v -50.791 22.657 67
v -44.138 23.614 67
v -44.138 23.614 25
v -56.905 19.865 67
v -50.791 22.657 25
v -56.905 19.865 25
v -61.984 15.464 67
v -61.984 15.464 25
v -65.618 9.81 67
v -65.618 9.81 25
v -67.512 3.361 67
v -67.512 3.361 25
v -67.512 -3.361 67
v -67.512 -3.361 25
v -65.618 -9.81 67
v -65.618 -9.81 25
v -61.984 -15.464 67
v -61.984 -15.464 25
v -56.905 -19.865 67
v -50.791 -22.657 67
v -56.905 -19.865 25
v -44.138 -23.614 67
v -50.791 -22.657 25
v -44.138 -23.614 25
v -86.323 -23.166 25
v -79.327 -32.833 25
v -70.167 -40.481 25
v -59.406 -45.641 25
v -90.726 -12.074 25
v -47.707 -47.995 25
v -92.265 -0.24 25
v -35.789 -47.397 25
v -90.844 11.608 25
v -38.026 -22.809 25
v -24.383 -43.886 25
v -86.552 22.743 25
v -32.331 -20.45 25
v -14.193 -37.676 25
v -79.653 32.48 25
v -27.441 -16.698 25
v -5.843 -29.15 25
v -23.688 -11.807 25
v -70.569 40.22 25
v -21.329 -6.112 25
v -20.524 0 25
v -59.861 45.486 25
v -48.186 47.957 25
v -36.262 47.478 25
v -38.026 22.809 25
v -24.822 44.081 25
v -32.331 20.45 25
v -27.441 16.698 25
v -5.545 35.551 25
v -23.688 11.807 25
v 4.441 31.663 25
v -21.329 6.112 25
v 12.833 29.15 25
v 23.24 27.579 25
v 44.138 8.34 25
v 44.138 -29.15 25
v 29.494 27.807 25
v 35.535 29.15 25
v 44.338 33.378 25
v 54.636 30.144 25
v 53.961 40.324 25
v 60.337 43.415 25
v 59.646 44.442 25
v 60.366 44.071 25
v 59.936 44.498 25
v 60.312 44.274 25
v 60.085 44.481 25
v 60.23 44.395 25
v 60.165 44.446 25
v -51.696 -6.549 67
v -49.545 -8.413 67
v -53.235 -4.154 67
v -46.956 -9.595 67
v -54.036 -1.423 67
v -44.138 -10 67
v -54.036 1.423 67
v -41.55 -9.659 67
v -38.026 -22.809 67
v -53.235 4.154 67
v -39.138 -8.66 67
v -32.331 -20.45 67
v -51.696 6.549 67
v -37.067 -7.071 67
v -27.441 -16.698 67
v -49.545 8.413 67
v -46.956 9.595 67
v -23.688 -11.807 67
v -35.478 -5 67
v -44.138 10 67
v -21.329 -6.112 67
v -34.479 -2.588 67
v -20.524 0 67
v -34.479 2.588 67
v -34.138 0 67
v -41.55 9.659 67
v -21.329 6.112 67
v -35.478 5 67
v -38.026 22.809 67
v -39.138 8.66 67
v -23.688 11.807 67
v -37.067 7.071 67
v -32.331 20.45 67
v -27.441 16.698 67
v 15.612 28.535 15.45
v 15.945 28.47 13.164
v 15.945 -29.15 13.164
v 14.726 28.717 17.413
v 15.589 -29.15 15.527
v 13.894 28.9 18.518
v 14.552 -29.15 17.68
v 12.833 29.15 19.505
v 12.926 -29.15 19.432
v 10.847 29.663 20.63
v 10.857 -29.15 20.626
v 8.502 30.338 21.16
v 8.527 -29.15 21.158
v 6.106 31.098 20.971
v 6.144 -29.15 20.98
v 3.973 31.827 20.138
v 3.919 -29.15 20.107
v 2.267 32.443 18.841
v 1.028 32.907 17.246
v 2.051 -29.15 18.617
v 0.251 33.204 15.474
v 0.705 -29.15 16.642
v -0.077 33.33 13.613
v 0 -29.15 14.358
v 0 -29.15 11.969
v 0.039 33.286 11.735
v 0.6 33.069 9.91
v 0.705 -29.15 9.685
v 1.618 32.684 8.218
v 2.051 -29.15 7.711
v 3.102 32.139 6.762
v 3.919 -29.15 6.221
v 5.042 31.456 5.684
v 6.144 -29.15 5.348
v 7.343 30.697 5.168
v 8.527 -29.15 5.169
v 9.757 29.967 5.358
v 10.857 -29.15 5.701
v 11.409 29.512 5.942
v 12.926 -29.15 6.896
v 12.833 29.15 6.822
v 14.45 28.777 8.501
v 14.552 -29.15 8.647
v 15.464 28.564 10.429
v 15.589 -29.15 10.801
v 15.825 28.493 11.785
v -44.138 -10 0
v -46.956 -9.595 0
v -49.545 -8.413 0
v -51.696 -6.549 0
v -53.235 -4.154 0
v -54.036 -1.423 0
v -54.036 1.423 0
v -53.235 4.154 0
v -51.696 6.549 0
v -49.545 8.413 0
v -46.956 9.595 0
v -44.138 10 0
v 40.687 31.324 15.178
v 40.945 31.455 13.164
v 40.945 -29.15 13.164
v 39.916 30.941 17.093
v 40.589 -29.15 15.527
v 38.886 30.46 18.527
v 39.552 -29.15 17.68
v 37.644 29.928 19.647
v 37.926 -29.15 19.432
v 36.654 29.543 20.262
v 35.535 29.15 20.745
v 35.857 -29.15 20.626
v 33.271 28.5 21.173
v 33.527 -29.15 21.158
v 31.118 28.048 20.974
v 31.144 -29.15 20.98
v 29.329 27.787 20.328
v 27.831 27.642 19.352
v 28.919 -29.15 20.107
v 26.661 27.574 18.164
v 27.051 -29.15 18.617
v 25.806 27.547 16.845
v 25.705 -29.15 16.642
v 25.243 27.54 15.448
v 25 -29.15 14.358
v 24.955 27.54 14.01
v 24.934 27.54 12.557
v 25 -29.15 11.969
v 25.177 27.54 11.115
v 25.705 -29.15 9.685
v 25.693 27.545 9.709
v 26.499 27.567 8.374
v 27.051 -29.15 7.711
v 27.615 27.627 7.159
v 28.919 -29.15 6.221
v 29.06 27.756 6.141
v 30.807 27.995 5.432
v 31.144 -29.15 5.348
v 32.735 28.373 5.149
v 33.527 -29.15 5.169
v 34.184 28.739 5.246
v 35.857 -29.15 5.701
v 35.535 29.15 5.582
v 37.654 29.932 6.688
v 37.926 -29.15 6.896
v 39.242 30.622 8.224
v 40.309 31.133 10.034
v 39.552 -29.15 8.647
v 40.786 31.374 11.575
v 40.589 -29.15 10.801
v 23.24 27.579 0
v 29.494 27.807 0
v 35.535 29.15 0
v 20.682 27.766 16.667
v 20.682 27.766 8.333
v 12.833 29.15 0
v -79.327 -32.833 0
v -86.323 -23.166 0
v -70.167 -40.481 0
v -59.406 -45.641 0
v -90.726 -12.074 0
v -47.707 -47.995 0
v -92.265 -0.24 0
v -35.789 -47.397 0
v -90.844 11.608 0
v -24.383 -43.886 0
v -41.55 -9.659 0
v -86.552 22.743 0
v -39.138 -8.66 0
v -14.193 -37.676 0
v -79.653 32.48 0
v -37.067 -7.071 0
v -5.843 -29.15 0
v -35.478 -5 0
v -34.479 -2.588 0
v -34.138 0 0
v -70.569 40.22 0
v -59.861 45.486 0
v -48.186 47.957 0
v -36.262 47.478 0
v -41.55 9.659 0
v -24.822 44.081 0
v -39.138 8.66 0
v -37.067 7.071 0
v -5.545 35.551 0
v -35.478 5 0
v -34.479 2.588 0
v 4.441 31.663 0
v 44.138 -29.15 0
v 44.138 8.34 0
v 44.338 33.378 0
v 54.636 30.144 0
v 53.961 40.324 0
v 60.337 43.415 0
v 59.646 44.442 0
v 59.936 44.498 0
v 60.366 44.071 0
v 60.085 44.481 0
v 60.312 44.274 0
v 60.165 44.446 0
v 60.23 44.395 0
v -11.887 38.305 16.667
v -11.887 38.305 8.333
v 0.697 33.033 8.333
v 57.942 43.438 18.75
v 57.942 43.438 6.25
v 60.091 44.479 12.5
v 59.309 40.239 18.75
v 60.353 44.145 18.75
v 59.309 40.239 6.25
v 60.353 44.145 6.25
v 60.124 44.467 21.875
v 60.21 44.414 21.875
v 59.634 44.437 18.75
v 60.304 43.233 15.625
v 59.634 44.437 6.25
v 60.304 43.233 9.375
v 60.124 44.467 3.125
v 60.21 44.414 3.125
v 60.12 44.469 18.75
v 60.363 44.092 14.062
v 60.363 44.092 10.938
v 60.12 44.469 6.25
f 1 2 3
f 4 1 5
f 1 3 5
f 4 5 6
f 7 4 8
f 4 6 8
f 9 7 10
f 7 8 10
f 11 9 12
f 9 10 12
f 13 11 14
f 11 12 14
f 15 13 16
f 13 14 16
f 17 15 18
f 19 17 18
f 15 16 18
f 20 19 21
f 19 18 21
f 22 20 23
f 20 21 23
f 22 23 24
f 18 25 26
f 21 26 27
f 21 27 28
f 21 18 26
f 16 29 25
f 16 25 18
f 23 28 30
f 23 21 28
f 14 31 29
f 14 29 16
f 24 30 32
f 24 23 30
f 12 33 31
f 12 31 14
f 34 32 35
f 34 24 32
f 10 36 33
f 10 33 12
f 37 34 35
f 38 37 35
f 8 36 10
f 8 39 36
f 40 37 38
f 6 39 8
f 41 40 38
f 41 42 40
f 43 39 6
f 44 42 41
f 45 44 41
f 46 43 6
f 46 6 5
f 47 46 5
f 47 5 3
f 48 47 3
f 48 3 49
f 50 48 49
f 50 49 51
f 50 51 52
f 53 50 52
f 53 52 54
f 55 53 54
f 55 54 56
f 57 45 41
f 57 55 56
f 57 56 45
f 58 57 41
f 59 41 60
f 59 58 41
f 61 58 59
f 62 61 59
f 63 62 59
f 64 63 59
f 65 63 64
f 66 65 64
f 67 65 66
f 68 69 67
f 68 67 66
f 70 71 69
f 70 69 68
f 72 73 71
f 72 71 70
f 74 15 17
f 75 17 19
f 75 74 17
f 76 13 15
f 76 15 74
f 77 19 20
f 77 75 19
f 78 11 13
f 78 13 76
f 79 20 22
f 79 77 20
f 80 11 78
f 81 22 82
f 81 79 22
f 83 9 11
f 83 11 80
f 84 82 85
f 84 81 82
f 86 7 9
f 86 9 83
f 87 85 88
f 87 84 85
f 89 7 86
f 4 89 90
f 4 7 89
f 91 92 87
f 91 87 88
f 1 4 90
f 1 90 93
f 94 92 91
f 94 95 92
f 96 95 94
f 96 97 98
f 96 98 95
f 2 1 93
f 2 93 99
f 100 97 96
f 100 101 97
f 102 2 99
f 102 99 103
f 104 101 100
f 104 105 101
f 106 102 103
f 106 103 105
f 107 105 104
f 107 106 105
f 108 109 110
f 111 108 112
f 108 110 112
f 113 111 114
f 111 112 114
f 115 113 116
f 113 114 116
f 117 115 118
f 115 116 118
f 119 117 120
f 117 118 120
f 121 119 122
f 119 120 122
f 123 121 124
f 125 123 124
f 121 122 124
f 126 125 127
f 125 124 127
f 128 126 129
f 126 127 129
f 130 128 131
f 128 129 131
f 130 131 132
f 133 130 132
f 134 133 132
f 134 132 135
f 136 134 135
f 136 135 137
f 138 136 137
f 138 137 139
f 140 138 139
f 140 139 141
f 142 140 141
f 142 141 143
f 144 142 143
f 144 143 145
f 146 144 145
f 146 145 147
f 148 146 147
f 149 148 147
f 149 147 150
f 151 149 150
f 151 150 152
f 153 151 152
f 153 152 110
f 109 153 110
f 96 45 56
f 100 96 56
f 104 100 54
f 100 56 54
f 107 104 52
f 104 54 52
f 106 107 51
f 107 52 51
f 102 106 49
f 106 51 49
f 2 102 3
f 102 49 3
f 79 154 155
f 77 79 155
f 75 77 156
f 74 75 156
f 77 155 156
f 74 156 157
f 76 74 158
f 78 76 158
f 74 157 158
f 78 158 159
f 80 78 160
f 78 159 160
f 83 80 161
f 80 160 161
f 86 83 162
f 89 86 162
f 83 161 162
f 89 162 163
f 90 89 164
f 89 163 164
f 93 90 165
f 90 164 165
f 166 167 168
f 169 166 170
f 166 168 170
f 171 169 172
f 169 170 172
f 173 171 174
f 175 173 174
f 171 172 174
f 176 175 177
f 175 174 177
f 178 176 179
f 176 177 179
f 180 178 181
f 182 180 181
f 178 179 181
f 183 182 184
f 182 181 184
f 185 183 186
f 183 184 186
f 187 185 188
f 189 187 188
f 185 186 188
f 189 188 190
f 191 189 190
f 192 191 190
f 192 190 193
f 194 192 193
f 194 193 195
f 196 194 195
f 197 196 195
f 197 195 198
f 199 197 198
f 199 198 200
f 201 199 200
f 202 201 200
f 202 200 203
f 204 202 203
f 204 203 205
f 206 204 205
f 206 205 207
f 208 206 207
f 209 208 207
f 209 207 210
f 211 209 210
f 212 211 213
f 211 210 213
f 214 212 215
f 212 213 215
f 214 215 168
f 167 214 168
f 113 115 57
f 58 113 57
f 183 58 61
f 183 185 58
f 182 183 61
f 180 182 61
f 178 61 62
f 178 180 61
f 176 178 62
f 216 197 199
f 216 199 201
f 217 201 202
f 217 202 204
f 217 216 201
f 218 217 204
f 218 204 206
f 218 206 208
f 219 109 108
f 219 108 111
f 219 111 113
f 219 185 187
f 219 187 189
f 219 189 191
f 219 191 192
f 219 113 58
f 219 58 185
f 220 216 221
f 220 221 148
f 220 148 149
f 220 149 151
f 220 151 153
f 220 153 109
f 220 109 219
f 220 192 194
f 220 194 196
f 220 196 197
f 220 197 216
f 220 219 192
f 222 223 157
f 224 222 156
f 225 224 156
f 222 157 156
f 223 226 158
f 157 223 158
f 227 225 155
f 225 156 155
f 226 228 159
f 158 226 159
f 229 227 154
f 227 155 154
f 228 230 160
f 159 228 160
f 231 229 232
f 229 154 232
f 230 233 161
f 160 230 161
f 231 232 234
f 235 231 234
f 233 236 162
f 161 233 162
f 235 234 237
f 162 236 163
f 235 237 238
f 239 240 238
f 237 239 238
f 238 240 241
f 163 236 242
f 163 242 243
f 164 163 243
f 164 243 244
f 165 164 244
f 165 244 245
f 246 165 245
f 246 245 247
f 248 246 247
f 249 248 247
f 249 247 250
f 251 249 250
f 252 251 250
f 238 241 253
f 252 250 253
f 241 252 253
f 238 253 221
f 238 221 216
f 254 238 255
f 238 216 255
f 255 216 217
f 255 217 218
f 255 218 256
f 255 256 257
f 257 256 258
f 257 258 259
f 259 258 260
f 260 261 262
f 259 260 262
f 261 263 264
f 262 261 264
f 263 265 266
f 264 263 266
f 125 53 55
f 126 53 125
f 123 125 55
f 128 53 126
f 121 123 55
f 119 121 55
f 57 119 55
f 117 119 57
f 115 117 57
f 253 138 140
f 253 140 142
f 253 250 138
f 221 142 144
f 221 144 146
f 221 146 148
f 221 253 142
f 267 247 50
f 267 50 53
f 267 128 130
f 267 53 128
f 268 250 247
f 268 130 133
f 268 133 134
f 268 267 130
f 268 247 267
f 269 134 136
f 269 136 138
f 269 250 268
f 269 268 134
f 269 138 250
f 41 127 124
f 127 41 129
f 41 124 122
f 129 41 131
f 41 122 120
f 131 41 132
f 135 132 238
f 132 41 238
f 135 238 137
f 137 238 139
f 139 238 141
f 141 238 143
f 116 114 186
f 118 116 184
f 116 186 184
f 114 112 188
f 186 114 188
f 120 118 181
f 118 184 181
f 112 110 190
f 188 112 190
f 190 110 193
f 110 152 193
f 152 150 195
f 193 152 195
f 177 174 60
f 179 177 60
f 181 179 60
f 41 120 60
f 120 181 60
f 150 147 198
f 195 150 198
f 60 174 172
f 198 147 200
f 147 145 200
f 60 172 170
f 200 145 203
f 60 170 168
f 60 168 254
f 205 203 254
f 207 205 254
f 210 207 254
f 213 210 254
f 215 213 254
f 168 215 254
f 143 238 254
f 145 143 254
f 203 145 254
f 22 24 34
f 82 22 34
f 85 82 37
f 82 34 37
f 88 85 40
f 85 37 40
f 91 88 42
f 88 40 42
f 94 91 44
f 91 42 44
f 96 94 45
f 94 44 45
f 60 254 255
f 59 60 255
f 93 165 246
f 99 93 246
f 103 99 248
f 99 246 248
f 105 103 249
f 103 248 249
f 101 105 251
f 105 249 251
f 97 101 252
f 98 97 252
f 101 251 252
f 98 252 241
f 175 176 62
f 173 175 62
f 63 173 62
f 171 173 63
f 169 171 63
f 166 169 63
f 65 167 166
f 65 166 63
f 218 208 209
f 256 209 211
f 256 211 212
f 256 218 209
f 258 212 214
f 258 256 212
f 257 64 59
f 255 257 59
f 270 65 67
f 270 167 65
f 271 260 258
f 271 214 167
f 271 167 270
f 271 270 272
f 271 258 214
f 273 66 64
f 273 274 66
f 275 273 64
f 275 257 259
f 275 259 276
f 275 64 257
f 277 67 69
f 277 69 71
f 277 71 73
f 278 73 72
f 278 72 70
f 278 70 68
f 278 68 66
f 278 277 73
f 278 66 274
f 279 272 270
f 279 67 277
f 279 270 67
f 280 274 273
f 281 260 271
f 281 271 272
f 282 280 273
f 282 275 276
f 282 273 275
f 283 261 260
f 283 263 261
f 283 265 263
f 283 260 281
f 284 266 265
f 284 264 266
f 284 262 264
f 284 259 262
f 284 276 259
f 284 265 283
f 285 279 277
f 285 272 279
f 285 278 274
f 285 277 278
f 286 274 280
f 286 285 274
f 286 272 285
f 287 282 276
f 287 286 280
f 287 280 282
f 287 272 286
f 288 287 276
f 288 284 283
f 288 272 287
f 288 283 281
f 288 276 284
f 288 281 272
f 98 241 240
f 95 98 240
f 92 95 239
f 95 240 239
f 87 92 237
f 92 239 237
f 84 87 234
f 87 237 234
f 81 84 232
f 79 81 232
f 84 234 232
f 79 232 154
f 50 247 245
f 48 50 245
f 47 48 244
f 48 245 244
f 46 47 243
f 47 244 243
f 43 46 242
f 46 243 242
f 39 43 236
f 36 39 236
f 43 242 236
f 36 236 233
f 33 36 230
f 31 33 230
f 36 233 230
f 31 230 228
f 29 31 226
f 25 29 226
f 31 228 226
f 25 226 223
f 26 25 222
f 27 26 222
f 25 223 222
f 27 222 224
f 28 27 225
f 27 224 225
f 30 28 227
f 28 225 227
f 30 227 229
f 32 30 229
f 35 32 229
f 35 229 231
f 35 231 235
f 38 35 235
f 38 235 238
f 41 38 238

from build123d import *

# Parameters (mm, degrees)
F1_DEPTH = 25
F2_DEPTH = 67
F3_R     = 8.0170654264
F4_DEPTH = 77.2782947511


with BuildPart() as f1:
    # F0 (on Top) → F1 (new body)
    with BuildSketch(Plane.XY):
        with BuildLine():
            Line((-44.1382192087, 23.6139522209), (-44.1382192087, 29.1501541541))
            Line((-44.1382192087, 29.1501541541), (-5.8434393396, 29.1501541541))
            ThreePointArc((-5.8434393396, 29.1501541541), (-14.3812854567, 37.8252104568), (-24.8224606144, 44.080870254))
            ThreePointArc((-24.8224606144, 44.080870254), (-90.7261926511, -12.074037558), (-5.8434393396, -29.1501541541))
            Line((-5.8434393396, -29.1501541541), (-44.1382192087, -29.1501541541))
            Line((-44.1382192087, -29.1501541541), (-44.1382192087, -23.6139522209))
            ThreePointArc((-44.1382192087, -23.6139522209), (-67.7521714295, 0), (-44.1382192087, 23.6139522209))
        make_face()
        with BuildLine():
            Line((12.8327377156, 29.1501541541), (-5.8434393396, 29.1501541541))
            ThreePointArc((-5.8434393396, 29.1501541541), (1.4646310503, 15.3818627182), (3.9889212884, 0))
            ThreePointArc((3.9889212884, 0), (1.4646310503, -15.3818627182), (-5.8434393396, -29.1501541541))
            Line((-5.8434393396, -29.1501541541), (44.1382192087, -29.1501541541))
            Line((44.1382192087, -29.1501541541), (44.1382192087, 8.3397841081))
            Line((44.1382192087, 8.3397841081), (44.1382192087, 29.1501541541))
            Line((44.1382192087, 29.1501541541), (35.5350334868, 29.1501541541))
            add(Edge.make_bspline(
                [(12.8327377156, 29.1501541541), (20.8092349471, 27.208546417), (28.4195513087, 26.8060990258), (35.5350334868, 29.1501541541)],
                knots=[0.2413128636, 0.2413128636, 0.2413128636, 0.2413128636, 0.4033216227, 0.4033216227, 0.4033216227, 0.4033216227], degree=3))
        make_face()
        with BuildLine():
            add(Edge.make_bspline(
                [(35.5350334868, 29.1501541541), (47.6218028789, 33.1319017108), (70.7323680982, 58.9476120465), (52.2453960839, 26.1592553027), (44.1382192087, 8.3397841081)],
                knots=[0.4033216227, 0.4033216227, 0.4033216227, 0.4033216227, 0.6785190669, 1, 1, 1, 1], degree=3))
            Line((35.5350334868, 29.1501541541), (44.1382192087, 29.1501541541))
            Line((44.1382192087, 29.1501541541), (44.1382192087, 8.3397841081))
        make_face()
        with BuildLine():
            ThreePointArc((-24.8224606144, 44.080870254), (-14.3812854567, 37.8252104568), (-5.8434393396, 29.1501541541))
            Line((-5.8434393396, 29.1501541541), (12.8327377156, 29.1501541541))
            add(Edge.make_bspline(
                [(-24.8224606144, 44.080870254), (-11.7417461231, 38.3490432302), (0.9517048626, 32.0421886703), (12.8327377156, 29.1501541541)],
                knots=[0, 0, 0, 0, 0.2413128636, 0.2413128636, 0.2413128636, 0.2413128636], degree=3))
        make_face()
        with BuildLine():
            Line((-5.8434393396, 29.1501541541), (-44.1382192087, 29.1501541541))
            Line((-44.1382192087, 29.1501541541), (-44.1382192087, 23.6139522209))
            ThreePointArc((-44.1382192087, 23.6139522209), (-27.4406334627, 16.697585746), (-20.5242669878, 0))
            ThreePointArc((-20.5242669878, 0), (-27.4406334627, -16.697585746), (-44.1382192087, -23.6139522209))
            Line((-44.1382192087, -23.6139522209), (-44.1382192087, -29.1501541541))
            Line((-44.1382192087, -29.1501541541), (-5.8434393396, -29.1501541541))
            ThreePointArc((-5.8434393396, -29.1501541541), (1.4646310503, -15.3818627182), (3.9889212884, 0))
            ThreePointArc((3.9889212884, 0), (1.4646310503, 15.3818627182), (-5.8434393396, 29.1501541541))
        make_face()
    extrude(amount=F1_DEPTH)

    # F0 (on Top) → F2 (join)
    with BuildSketch(Plane.XY):
        with BuildLine():
            Line((-44.1382192087, 10), (-44.1382192087, 23.6139522209))
            ThreePointArc((-44.1382192087, 23.6139522209), (-67.7521714295, 0), (-44.1382192087, -23.6139522209))
            Line((-44.1382192087, -23.6139522209), (-44.1382192087, -10))
            ThreePointArc((-44.1382192087, -10), (-54.1382192087, 0), (-44.1382192087, 10))
        make_face()
        with BuildLine():
            ThreePointArc((-20.5242669878, 0), (-27.4406334627, 16.697585746), (-44.1382192087, 23.6139522209))
            Line((-44.1382192087, 23.6139522209), (-44.1382192087, 10))
            ThreePointArc((-44.1382192087, 10), (-37.0671513968, 7.0710678119), (-34.1382192087, 0))
            ThreePointArc((-34.1382192087, 0), (-37.0671513968, -7.0710678119), (-44.1382192087, -10))
            Line((-44.1382192087, -10), (-44.1382192087, -23.6139522209))
            ThreePointArc((-44.1382192087, -23.6139522209), (-27.4406334627, -16.697585746), (-20.5242669878, 0))
        make_face()
    extrude(amount=F2_DEPTH)

    # F3 (on face) → F4 (cut, through all)
    with BuildSketch(Plane.XZ.offset(29.1501541541)):
        with Locations((7.9276636243, 13.1636038423)):
            Circle(F3_R)
        with Locations((32.9276636243, 13.1636038423)):
            Circle(F3_R)
    extrude(amount=-F4_DEPTH, mode=Mode.SUBTRACT)


solid = f1.part
